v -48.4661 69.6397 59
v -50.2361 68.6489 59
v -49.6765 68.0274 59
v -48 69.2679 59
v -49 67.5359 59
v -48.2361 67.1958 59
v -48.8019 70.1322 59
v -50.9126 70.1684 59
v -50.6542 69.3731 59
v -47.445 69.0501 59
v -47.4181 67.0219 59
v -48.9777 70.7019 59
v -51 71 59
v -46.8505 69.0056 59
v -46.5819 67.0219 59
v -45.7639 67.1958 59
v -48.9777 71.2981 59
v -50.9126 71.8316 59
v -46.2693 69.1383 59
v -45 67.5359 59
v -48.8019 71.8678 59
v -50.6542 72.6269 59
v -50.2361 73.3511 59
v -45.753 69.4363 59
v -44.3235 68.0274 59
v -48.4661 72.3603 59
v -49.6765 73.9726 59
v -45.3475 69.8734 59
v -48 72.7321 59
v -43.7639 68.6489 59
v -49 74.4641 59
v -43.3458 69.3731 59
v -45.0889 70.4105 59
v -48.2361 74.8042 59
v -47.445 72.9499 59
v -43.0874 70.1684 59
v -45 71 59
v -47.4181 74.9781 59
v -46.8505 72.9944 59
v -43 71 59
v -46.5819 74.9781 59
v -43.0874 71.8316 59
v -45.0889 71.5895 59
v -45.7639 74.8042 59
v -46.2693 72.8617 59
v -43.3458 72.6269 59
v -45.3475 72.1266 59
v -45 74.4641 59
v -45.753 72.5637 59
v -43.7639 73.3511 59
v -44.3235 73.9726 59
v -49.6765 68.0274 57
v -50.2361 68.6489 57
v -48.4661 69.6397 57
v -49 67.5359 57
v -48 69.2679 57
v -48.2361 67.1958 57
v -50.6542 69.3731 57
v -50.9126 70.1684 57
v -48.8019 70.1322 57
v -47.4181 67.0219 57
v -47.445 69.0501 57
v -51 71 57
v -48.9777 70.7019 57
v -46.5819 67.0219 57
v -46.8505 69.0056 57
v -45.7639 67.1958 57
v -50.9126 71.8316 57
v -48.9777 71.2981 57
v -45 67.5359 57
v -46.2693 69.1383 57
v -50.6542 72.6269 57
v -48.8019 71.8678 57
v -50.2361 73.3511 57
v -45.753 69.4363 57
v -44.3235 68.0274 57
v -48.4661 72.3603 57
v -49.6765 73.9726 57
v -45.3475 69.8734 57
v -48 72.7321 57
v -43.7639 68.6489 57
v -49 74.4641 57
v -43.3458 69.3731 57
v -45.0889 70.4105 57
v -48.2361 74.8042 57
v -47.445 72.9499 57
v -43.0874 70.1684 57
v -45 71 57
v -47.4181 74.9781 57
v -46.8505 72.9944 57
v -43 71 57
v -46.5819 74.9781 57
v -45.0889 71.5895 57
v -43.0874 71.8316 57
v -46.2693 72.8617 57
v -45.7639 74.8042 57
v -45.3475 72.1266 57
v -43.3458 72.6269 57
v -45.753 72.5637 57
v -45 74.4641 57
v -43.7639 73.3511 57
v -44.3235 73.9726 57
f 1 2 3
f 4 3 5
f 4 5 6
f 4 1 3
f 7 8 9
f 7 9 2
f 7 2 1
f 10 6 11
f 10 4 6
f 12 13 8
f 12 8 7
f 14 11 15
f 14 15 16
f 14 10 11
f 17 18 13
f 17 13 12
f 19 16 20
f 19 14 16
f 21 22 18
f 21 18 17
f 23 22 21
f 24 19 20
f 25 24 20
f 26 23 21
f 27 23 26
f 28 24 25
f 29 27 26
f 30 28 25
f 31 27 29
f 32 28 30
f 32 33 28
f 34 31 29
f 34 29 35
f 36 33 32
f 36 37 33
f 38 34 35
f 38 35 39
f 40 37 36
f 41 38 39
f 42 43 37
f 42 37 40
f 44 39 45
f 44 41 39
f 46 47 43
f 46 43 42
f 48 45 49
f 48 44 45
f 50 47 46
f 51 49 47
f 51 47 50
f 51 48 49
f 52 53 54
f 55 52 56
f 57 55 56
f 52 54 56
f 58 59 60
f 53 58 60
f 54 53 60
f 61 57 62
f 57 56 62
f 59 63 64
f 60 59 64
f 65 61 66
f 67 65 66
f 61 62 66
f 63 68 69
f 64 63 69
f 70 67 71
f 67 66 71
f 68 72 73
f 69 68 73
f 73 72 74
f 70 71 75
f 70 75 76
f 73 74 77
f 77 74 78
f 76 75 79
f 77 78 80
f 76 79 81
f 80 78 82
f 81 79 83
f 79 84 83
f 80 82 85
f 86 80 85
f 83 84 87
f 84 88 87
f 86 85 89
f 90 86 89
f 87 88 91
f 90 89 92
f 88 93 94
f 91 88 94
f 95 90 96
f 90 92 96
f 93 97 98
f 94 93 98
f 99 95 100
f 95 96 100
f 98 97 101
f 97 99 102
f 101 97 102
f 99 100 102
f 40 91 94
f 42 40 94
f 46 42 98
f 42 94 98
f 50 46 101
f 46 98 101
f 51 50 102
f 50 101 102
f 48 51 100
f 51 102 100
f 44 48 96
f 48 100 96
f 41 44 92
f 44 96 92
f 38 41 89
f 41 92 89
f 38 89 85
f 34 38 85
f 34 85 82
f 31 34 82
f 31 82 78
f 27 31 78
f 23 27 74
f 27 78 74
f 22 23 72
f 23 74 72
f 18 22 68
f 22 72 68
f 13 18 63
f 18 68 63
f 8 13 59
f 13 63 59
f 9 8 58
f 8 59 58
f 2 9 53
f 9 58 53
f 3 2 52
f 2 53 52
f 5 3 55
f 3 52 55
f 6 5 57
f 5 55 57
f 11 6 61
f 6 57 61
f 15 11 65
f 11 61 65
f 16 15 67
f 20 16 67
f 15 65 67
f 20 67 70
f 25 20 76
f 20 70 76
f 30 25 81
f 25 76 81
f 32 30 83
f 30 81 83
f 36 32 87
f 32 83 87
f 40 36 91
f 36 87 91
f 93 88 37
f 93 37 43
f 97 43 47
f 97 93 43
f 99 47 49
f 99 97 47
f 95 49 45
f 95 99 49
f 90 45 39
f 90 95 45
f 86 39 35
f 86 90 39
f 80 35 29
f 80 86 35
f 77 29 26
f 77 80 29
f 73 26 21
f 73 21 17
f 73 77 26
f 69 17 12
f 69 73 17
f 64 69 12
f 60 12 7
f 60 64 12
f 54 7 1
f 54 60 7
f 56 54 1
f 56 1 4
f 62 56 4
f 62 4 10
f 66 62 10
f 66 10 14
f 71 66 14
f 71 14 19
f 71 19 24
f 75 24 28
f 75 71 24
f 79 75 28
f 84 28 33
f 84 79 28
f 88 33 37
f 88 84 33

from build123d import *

# Parameters (mm, degrees)
CYLINDER355_R     = 2
CYLINDER355_DEPTH = 2
CYLINDER356_R     = 4
CYLINDER356_DEPTH = 2


with BuildPart() as cylinder355:
    # Cylinder355 → Cylinder355 (new body)
    with BuildSketch(Plane.XY):
        Circle(CYLINDER355_R)
    extrude(amount=CYLINDER355_DEPTH)


with BuildPart() as spacer4:
    # Cylinder356 → Cylinder356 (new body)
    with BuildSketch(Plane.XY):
        Circle(CYLINDER356_R)
    extrude(amount=CYLINDER356_DEPTH)

    # Cut372: cut Cylinder355
    add(cylinder355.part, mode=Mode.SUBTRACT)


with BuildPart() as spacer4_1:
    # Cut372 placement: moved
    add(spacer4.part.moved(Location((-47, 71, 57))))


solid = spacer4_1.part
